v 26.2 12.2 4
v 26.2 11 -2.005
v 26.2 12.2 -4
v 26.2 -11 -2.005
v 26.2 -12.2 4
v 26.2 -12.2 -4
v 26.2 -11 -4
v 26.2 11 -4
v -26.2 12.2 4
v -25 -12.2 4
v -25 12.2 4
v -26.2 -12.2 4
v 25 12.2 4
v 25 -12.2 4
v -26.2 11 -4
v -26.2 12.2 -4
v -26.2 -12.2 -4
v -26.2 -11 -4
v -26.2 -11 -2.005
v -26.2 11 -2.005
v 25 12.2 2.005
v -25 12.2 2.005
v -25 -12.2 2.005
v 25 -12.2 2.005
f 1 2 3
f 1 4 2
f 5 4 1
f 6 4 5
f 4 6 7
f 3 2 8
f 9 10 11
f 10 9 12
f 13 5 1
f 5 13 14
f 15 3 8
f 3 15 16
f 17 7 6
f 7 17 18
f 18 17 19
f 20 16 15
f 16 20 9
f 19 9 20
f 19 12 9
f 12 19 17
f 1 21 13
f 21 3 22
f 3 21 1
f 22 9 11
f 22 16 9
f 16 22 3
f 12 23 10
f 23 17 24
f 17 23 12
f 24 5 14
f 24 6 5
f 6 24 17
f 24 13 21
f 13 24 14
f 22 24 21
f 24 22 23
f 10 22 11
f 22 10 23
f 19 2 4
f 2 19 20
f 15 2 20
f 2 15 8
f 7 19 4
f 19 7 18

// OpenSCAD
// The height to raise the webcam by. (The thickness of the shim.)
rise_height = 4;

// The width (left-to-right) of the webcam bracket as it rests on the monitor.
webcam_bracket_width = 50;

// The depth of the monitor frame (front-to-back).
monitor_depth = 22;

module __no_more_params__() {}

rail_height = 2;
rail_thickness = 1.2;


difference() {
    cube([
            webcam_bracket_width + rail_thickness * 2,
            monitor_depth + rail_thickness * 2,
            rise_height + rail_height + rail_height,
        ],
        center=true);
        
    translate([0,0,(rise_height + rail_height + rail_height)/2 - rail_height/2+ 0.01 ])
        #cube([
            webcam_bracket_width,
            monitor_depth + rail_thickness * 2 + 0.01,
            rail_height + 0.01,
        ],
        center=true
        );

    translate([0,0,-(rise_height + rail_height + rail_height)/2 + rail_height/2 - 0.01])
        #cube([
            webcam_bracket_width + rail_thickness * 2 + 0.01,
            monitor_depth,
            rail_height + 0.01,
        ],
        center=true);
}
